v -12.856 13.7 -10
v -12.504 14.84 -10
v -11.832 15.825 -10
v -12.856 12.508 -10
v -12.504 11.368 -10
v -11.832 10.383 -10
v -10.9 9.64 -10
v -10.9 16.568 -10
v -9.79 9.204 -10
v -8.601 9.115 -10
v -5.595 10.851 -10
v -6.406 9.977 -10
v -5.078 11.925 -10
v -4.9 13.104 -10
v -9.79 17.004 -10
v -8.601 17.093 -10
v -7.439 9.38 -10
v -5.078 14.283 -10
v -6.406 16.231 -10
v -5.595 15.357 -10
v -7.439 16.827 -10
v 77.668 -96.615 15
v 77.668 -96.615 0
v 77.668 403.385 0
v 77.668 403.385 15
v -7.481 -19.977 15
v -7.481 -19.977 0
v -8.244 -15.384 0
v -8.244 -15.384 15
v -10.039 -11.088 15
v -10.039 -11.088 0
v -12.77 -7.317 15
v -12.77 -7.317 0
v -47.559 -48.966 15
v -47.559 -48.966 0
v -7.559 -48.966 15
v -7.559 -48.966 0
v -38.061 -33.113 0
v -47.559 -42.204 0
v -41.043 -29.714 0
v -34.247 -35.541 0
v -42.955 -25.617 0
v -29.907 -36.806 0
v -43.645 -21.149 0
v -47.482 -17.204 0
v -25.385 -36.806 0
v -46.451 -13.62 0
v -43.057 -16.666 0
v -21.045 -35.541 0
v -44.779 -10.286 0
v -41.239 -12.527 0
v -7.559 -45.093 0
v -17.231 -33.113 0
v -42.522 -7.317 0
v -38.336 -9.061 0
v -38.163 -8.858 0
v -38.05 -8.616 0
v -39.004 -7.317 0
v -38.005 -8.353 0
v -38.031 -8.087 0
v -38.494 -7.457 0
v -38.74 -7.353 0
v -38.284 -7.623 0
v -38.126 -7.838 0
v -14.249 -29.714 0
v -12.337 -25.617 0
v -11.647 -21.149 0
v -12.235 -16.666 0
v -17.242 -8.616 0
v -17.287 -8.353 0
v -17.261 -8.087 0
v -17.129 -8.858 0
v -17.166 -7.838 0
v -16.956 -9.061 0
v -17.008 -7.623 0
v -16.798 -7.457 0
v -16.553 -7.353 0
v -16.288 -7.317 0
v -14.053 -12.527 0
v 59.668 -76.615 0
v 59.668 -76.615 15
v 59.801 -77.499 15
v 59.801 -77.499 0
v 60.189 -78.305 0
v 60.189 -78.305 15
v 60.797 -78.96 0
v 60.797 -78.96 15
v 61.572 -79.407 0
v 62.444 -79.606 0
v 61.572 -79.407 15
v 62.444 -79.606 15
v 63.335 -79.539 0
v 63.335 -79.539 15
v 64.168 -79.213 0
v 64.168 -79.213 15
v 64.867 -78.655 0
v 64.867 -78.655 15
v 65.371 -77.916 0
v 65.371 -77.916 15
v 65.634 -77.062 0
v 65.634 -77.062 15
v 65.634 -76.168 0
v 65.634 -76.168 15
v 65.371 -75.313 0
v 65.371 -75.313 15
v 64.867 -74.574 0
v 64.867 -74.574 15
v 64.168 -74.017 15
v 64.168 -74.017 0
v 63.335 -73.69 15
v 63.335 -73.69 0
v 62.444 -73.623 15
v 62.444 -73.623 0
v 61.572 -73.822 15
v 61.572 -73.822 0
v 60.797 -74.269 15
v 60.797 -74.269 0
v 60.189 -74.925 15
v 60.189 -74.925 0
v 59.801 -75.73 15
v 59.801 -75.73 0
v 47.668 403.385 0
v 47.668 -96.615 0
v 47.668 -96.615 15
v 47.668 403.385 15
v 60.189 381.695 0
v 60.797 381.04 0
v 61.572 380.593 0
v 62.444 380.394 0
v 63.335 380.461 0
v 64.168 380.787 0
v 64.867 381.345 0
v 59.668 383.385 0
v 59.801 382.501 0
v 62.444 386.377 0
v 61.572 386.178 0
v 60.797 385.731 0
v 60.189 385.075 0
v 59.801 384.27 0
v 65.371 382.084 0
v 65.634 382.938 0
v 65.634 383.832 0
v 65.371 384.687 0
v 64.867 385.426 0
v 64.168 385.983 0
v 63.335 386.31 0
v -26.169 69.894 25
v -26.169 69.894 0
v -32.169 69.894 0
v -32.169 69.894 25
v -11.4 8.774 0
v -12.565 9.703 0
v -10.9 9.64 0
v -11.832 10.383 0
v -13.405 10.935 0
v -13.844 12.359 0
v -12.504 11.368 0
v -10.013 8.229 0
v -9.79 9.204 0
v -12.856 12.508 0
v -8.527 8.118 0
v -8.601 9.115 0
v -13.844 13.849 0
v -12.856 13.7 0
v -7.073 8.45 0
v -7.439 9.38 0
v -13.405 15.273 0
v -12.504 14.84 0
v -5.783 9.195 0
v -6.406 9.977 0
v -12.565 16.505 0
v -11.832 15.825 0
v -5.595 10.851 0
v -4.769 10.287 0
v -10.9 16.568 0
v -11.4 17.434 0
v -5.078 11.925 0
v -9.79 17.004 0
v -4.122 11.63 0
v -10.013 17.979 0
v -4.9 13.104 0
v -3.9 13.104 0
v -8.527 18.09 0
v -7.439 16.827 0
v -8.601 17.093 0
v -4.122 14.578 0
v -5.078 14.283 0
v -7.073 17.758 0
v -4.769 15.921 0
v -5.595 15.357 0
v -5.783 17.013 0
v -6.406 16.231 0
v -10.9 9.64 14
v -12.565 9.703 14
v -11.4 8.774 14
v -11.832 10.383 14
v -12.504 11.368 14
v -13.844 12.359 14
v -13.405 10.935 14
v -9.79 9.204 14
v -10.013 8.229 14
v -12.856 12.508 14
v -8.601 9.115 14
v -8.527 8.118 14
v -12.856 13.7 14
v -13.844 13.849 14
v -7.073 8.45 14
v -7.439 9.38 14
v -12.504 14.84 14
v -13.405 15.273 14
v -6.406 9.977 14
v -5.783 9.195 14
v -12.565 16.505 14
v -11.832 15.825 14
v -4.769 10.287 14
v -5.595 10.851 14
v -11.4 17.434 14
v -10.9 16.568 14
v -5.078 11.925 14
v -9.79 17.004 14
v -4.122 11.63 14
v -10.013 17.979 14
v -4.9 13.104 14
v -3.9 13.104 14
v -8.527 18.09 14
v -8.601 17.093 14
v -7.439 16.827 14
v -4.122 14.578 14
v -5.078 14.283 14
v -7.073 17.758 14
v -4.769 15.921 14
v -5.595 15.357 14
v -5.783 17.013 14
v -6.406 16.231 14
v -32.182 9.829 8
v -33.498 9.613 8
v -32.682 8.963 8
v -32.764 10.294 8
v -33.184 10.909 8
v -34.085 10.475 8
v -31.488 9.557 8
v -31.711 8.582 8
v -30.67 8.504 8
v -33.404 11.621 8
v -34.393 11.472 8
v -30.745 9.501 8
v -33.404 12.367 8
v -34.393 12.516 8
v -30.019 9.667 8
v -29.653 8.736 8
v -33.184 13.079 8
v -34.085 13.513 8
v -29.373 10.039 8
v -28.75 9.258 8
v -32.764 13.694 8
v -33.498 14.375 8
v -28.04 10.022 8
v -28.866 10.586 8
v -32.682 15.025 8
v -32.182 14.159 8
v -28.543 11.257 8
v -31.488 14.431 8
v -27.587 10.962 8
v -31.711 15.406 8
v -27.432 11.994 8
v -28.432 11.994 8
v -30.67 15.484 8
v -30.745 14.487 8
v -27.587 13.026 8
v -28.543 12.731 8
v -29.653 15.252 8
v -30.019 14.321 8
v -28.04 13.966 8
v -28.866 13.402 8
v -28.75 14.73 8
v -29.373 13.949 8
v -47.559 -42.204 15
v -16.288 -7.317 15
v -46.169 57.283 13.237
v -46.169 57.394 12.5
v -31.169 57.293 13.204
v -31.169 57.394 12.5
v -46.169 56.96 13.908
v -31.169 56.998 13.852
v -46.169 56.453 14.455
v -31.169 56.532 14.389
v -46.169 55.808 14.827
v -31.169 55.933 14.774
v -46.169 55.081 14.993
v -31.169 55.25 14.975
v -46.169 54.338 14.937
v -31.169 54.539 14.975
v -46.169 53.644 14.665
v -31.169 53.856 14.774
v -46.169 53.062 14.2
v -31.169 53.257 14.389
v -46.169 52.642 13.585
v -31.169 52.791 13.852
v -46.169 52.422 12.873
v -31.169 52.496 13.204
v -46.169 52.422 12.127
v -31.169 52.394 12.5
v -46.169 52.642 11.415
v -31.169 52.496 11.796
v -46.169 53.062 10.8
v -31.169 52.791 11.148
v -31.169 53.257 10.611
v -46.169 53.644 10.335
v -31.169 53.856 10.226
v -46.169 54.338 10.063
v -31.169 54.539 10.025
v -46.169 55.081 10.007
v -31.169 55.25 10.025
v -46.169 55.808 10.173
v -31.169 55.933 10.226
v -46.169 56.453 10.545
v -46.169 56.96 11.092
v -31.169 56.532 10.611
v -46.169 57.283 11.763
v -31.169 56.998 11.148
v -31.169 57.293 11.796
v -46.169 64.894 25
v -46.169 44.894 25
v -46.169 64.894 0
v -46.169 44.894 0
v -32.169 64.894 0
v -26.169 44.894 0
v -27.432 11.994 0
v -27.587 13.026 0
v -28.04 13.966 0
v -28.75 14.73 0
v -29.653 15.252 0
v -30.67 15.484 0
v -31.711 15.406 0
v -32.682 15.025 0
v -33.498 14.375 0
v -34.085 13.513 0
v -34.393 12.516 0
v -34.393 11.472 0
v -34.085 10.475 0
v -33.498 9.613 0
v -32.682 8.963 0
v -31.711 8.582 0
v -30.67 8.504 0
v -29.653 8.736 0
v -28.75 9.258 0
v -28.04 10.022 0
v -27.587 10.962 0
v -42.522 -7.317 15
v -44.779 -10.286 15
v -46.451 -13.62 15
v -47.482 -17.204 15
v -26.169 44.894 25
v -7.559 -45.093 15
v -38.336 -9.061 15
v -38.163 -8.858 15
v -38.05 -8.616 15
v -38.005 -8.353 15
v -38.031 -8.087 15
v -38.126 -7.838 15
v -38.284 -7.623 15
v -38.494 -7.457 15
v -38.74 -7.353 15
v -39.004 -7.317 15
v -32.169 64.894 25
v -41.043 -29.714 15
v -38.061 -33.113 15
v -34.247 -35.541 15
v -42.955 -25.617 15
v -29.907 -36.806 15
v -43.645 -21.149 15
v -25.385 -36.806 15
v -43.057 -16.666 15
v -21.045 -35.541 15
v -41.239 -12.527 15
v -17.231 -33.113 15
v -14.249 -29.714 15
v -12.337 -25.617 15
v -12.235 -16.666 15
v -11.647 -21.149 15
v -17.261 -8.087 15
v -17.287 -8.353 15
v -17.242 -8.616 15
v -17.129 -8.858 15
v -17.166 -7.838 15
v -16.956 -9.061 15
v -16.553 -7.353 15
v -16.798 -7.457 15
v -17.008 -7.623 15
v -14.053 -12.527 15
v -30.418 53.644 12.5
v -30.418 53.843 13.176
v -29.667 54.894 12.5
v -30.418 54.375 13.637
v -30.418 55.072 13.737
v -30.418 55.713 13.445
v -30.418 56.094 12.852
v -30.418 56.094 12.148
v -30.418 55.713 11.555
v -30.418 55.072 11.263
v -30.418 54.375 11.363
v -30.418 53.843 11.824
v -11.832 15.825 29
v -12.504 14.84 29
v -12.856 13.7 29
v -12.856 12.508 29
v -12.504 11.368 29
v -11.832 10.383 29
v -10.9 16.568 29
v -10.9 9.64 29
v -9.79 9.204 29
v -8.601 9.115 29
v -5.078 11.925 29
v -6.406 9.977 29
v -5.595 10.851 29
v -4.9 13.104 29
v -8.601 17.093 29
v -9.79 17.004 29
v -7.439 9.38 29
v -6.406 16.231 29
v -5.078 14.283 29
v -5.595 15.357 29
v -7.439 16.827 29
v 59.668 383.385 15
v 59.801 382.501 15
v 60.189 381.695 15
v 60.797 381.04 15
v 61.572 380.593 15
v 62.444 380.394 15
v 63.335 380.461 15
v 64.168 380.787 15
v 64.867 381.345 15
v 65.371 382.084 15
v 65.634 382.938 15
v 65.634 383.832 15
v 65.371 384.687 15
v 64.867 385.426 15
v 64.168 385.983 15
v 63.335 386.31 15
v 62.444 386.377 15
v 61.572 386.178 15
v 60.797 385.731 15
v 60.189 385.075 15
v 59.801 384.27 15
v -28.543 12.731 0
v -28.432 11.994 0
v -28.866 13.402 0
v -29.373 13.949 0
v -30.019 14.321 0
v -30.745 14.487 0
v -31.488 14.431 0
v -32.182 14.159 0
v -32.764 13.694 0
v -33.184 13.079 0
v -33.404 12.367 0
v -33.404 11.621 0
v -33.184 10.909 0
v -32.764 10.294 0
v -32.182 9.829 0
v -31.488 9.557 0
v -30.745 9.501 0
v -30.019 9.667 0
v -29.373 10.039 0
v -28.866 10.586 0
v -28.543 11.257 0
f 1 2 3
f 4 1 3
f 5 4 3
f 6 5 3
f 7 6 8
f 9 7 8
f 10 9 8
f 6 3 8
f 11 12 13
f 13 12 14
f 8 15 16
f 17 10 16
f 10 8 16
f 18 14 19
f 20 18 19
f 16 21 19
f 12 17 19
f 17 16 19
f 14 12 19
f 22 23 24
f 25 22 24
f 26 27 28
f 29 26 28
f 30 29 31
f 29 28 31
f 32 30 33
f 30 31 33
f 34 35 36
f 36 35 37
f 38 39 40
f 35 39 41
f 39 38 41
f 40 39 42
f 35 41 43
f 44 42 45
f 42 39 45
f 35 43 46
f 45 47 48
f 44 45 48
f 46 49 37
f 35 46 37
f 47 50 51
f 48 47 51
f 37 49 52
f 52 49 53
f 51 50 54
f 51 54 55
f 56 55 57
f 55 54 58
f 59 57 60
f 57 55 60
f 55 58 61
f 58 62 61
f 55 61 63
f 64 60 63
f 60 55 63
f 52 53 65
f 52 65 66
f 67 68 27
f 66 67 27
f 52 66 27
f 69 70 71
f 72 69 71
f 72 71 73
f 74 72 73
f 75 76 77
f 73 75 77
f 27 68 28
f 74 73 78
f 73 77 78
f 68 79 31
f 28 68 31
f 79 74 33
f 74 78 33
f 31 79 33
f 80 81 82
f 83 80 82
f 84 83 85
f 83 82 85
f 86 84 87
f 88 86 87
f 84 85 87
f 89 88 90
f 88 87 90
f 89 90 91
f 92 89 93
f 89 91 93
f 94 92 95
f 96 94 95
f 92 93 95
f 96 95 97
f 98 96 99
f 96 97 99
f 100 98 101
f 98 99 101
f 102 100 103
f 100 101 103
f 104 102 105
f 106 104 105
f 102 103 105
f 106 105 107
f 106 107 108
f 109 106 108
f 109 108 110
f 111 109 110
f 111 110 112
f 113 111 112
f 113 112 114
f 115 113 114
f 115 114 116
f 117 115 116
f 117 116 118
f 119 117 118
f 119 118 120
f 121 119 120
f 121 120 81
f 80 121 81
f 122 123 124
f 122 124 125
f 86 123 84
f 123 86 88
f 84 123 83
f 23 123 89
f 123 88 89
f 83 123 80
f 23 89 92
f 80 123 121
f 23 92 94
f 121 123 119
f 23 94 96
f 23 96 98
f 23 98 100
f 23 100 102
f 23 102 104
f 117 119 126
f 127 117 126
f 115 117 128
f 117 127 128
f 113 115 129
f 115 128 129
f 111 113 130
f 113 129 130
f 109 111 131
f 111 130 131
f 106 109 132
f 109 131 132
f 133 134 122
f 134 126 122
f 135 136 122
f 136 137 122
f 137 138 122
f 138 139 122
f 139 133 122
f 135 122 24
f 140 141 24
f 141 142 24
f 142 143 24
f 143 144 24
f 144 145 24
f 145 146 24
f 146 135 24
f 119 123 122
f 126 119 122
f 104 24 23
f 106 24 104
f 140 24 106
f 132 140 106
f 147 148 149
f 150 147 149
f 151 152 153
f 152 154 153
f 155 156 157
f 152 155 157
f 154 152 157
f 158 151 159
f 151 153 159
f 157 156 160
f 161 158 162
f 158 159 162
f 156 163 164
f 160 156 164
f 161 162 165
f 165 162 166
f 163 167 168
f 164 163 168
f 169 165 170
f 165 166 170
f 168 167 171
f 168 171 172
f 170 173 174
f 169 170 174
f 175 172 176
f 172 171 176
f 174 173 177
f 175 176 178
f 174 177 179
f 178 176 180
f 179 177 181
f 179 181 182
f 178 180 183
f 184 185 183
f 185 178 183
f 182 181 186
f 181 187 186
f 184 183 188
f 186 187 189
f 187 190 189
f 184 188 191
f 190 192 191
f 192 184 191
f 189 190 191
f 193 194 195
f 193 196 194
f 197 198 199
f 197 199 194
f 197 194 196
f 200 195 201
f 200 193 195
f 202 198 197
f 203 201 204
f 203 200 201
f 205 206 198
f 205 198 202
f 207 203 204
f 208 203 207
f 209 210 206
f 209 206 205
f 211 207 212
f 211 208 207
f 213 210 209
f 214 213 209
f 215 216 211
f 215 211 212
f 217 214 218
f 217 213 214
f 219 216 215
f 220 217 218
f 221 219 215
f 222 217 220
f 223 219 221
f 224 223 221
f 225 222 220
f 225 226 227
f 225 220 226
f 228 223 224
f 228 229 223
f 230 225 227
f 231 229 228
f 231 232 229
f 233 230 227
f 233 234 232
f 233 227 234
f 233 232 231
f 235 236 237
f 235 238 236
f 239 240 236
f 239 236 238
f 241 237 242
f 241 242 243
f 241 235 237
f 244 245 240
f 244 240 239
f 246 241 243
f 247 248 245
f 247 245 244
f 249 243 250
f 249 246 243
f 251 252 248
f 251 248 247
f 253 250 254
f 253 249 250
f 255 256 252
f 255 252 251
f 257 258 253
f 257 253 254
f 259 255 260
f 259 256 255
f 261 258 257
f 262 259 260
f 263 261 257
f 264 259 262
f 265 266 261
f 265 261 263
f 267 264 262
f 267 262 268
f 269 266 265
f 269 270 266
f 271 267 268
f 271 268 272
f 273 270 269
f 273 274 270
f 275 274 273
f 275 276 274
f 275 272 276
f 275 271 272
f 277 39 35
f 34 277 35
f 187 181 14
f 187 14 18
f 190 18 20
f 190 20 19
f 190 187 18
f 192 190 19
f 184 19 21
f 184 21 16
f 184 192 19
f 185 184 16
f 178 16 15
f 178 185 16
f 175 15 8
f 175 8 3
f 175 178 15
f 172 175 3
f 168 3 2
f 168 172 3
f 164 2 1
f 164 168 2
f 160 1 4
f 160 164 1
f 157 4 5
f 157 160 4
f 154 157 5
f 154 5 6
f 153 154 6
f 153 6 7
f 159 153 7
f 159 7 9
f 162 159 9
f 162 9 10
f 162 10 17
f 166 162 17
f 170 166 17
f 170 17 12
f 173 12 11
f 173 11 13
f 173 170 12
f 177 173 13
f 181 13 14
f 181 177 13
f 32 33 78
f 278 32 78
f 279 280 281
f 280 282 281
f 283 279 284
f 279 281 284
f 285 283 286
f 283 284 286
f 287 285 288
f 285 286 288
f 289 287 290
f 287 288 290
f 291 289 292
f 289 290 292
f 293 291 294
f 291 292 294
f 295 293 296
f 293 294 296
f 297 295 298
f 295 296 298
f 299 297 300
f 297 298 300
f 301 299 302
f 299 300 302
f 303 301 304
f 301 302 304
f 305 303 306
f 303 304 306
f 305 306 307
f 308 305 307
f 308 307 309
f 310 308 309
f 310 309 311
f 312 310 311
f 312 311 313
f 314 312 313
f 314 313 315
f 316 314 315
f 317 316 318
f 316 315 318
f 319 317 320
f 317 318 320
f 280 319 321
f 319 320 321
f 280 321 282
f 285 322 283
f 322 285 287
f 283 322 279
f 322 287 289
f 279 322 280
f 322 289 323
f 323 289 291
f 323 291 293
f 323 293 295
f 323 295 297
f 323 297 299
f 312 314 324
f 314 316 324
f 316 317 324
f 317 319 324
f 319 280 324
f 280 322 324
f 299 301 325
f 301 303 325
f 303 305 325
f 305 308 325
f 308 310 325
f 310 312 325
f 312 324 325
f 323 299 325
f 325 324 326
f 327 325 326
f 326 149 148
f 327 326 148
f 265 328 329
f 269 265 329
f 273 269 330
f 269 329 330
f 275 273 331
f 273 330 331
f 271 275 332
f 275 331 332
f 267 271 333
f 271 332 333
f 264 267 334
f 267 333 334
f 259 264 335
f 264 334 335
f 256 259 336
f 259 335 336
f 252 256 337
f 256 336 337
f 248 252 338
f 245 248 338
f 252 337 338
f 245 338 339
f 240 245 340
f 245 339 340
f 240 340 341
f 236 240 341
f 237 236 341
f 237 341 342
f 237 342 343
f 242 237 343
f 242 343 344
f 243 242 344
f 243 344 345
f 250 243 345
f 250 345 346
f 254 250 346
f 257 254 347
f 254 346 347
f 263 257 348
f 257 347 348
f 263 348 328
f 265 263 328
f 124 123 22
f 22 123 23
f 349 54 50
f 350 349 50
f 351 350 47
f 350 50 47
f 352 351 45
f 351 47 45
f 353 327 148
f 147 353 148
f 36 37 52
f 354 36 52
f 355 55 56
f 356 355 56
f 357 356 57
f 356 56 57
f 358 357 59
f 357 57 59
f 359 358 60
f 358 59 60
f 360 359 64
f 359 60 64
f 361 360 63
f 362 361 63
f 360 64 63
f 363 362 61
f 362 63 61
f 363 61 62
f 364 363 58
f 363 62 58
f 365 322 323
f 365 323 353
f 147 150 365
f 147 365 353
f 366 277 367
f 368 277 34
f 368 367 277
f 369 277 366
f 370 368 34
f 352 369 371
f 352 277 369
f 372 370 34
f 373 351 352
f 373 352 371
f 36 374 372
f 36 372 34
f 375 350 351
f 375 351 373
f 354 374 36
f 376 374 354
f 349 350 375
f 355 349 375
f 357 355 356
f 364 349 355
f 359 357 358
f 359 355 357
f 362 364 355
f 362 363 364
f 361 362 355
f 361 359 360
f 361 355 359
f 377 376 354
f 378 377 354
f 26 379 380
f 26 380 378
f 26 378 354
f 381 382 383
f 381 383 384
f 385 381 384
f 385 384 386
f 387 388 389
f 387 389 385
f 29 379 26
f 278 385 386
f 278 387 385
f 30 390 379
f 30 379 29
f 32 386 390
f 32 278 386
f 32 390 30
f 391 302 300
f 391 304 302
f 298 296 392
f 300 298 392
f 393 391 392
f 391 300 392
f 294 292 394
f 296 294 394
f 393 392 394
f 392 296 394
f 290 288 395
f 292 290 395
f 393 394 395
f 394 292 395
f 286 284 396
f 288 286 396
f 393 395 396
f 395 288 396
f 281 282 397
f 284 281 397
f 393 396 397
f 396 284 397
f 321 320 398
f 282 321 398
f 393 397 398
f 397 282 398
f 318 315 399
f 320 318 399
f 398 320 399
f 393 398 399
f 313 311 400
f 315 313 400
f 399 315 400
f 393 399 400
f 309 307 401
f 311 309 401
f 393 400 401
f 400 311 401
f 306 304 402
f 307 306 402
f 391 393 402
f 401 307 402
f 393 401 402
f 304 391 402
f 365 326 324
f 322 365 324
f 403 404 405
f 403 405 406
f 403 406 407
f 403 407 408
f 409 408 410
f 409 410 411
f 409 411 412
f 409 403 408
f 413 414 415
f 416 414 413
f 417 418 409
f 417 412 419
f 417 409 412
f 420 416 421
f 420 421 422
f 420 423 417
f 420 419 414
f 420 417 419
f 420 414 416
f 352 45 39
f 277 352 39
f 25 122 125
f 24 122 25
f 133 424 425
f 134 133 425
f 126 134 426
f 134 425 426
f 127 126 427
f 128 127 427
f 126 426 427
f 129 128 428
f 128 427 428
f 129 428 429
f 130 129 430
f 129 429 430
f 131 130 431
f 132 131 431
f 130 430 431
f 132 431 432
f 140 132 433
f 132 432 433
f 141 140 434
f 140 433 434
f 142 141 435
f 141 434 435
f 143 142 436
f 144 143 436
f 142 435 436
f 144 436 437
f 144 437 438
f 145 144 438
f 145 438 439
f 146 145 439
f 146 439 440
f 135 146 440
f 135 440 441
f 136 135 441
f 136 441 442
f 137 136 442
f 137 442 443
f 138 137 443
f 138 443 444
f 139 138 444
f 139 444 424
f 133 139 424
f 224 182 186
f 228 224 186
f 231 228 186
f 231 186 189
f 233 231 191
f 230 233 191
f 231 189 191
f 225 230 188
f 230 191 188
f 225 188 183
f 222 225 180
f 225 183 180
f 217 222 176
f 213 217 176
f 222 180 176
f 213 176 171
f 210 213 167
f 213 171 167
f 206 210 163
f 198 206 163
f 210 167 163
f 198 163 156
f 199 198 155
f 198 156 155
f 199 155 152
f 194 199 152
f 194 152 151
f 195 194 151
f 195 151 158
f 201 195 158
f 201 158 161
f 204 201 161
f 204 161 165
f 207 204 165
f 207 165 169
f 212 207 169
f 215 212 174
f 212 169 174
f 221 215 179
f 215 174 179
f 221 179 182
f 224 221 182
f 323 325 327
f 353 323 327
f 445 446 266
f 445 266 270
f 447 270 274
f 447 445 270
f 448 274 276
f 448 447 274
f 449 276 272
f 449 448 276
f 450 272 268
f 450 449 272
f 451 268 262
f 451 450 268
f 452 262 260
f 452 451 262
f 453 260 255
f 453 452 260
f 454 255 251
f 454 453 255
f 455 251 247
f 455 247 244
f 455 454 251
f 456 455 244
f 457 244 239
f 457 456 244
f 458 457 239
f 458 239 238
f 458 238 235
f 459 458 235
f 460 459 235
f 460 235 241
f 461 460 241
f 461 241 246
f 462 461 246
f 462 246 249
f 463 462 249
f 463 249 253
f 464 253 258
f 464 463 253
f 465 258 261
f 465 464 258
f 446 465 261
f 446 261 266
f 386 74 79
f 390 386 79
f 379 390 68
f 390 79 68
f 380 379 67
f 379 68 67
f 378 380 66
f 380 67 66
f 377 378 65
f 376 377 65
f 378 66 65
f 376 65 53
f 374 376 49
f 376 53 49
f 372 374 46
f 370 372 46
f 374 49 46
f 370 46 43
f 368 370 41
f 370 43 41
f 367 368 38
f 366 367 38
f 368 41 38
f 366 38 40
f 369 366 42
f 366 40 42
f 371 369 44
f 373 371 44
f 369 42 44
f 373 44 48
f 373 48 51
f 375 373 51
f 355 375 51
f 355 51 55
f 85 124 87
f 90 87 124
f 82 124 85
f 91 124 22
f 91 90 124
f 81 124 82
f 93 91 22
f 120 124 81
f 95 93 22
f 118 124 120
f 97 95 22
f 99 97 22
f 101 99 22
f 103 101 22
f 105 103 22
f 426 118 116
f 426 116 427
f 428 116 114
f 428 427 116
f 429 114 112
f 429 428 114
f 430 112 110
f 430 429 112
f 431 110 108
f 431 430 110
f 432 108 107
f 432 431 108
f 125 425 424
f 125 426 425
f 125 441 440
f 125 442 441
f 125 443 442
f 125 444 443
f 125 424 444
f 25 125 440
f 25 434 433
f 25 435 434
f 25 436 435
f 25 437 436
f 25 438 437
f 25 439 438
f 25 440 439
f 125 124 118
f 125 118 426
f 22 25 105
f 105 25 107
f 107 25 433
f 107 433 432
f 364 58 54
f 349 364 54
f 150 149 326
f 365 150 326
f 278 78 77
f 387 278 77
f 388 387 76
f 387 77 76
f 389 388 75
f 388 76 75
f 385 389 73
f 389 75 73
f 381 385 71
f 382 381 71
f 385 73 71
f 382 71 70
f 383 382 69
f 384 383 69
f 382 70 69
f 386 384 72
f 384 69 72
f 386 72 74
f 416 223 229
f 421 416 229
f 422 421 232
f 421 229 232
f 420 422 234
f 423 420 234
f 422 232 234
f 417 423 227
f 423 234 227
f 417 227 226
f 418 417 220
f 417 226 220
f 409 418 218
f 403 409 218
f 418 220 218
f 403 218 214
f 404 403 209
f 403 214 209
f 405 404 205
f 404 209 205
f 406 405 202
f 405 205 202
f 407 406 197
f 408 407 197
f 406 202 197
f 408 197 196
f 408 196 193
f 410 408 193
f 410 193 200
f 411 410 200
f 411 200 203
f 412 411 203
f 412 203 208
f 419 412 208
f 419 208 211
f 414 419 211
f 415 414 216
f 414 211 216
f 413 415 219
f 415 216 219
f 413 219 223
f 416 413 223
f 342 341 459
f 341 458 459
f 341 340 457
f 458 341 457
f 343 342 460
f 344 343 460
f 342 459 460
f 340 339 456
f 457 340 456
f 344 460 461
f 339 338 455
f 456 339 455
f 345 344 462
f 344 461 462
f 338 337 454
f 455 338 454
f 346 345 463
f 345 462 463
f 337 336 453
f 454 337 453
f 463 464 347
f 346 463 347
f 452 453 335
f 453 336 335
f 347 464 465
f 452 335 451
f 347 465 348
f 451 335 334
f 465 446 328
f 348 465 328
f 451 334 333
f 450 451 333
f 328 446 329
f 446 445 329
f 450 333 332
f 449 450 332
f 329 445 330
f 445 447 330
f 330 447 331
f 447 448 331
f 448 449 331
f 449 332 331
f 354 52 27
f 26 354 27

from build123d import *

# Parameters (mm, degrees)
F0_R      = 3.5
F0_R_2    = 2.5
F1_DEPTH  = 8
F0_R_3    = 4
F2_DEPTH  = 10
F0_R_4    = 5
F3_DEPTH  = 14
F4_R      = 4
F5_DEPTH  = 15
F0_W      = 30
F0_H      = 500
F6_DEPTH  = 15
F7_D      = 6
F8_DEPTH  = 25
F10_D     = 5
F10_DEPTH = 15
F10_TIP   = 1.5021515476
F11_DEPTH = 15


with BuildPart() as f1:
    # F0 (on Top) → F1 (new body)
    with BuildSketch(Plane.XY):
        with Locations((-30.9318657964, 11.9939884171)):
            Circle(F0_R)
        with Locations((-30.9318657964, 11.9939884171)):
            Circle(F0_R_2, mode=Mode.SUBTRACT)
    extrude(amount=F1_DEPTH)


with BuildPart() as f2:
    # F0 (on Top) → F2 (new body)
    with BuildSketch(Plane.XY):
        with Locations((-8.900186047, 13.1039824337)):
            Circle(F0_R_3)
    extrude(amount=-F2_DEPTH)

    # F0 (on Top) → F3 (join)
    with BuildSketch(Plane.XY):
        with Locations((-8.900186047, 13.1039824337)):
            Circle(F0_R_4)
        with Locations((-8.900186047, 13.1039824337)):
            Circle(F0_R_3, mode=Mode.SUBTRACT)
        with Locations((-8.900186047, 13.1039824337)):
            Circle(F0_R_3)
    extrude(amount=F3_DEPTH)

    # F4 (on face) → F5 (join)
    with BuildSketch(Plane.XY.offset(14)):
        with Locations((-8.900186047, 13.1039824337)):
            Circle(F4_R)
    extrude(amount=F5_DEPTH)


with BuildPart() as f6:
    # F0 (on Top) → F6 (new body)
    with BuildSketch(Plane.XY):
        with Locations((62.6677641273, 153.3853390813)):
            Rectangle(F0_W, F0_H)
    extrude(amount=F6_DEPTH)

    # F7 (through all)
    with Locations(Plane(origin=(0, 0, 0), x_dir=(1, 0, 0), z_dir=(0, 0, -1))):
        with Locations((62.6677641273, -383.3853390813), (62.6677641273, 76.6146609187)):
            Hole(F7_D / 2)


with BuildPart() as f8:
    # F0 (on Top) → F8 (new body)
    with BuildSketch(Plane.XY):
        Polygon((-46.1693040282, 64.8944717646), (-46.1693040282, 44.8944717646), (-26.1693040282, 44.8944717646), (-26.1693040282, 69.8944717646), (-32.1693040282, 69.8944717646), (-32.1693040282, 64.8944717646), align=None)
    extrude(amount=F8_DEPTH)

    # F10
    with Locations(Plane(origin=(-46.1693040282, 0, 0), x_dir=(0, -1, 0), z_dir=(-1, 0, 0))):
        with Locations((-54.8944717646, 12.5)):
            Hole(F10_D / 2, depth=F10_DEPTH)
            with Locations((0, 0, -(F10_DEPTH + F10_TIP / 2))):  # 118° drill point
                Cone(0, F10_D / 2, F10_TIP, mode=Mode.SUBTRACT)


with BuildPart() as f11:
    # F0 (on Top) → F11 (new body)
    with BuildSketch(Plane.XY):
        with BuildLine():
            ThreePointArc((-16.9560693478, -9.0613515281), (-27.6460252004, -36.9661759228), (-38.335981053, -9.0613515281))
            ThreePointArc((-38.335981053, -9.0613515281), (-38.0702800973, -7.9595651328), (-39.0041032938, -7.3173000034))
            Line((-39.0041032938, -7.3173000034), (-42.5224557581, -7.3173000034))
            ThreePointArc((-42.5224557581, -7.3173000034), (-45.6922677928, -11.9144839099), (-47.4815241961, -17.2041313204))
            Line((-47.4815241961, -17.2041313204), (-47.5590697005, -42.204011054))
            Line((-47.5590697005, -42.204011054), (-47.5590697005, -48.9661759228))
            Line((-47.5590697005, -48.9661759228), (-7.5590697005, -48.9661759228))
            Line((-7.5590697005, -48.9661759228), (-7.5590697005, -45.0931087413))
            Line((-7.5590697005, -45.0931087413), (-7.4811638343, -19.9770520248))
            ThreePointArc((-7.4811638343, -19.9770520248), (-9.0170057621, -13.1841688059), (-12.7695946427, -7.3173000034))
            Line((-12.7695946427, -7.3173000034), (-16.287947107, -7.3173000034))
            ThreePointArc((-16.287947107, -7.3173000034), (-17.2217703035, -7.9595651328), (-16.9560693478, -9.0613515281))
        make_face()
    extrude(amount=F11_DEPTH)


solid = Compound([f1.part, f2.part, f6.part, f8.part, f11.part])
